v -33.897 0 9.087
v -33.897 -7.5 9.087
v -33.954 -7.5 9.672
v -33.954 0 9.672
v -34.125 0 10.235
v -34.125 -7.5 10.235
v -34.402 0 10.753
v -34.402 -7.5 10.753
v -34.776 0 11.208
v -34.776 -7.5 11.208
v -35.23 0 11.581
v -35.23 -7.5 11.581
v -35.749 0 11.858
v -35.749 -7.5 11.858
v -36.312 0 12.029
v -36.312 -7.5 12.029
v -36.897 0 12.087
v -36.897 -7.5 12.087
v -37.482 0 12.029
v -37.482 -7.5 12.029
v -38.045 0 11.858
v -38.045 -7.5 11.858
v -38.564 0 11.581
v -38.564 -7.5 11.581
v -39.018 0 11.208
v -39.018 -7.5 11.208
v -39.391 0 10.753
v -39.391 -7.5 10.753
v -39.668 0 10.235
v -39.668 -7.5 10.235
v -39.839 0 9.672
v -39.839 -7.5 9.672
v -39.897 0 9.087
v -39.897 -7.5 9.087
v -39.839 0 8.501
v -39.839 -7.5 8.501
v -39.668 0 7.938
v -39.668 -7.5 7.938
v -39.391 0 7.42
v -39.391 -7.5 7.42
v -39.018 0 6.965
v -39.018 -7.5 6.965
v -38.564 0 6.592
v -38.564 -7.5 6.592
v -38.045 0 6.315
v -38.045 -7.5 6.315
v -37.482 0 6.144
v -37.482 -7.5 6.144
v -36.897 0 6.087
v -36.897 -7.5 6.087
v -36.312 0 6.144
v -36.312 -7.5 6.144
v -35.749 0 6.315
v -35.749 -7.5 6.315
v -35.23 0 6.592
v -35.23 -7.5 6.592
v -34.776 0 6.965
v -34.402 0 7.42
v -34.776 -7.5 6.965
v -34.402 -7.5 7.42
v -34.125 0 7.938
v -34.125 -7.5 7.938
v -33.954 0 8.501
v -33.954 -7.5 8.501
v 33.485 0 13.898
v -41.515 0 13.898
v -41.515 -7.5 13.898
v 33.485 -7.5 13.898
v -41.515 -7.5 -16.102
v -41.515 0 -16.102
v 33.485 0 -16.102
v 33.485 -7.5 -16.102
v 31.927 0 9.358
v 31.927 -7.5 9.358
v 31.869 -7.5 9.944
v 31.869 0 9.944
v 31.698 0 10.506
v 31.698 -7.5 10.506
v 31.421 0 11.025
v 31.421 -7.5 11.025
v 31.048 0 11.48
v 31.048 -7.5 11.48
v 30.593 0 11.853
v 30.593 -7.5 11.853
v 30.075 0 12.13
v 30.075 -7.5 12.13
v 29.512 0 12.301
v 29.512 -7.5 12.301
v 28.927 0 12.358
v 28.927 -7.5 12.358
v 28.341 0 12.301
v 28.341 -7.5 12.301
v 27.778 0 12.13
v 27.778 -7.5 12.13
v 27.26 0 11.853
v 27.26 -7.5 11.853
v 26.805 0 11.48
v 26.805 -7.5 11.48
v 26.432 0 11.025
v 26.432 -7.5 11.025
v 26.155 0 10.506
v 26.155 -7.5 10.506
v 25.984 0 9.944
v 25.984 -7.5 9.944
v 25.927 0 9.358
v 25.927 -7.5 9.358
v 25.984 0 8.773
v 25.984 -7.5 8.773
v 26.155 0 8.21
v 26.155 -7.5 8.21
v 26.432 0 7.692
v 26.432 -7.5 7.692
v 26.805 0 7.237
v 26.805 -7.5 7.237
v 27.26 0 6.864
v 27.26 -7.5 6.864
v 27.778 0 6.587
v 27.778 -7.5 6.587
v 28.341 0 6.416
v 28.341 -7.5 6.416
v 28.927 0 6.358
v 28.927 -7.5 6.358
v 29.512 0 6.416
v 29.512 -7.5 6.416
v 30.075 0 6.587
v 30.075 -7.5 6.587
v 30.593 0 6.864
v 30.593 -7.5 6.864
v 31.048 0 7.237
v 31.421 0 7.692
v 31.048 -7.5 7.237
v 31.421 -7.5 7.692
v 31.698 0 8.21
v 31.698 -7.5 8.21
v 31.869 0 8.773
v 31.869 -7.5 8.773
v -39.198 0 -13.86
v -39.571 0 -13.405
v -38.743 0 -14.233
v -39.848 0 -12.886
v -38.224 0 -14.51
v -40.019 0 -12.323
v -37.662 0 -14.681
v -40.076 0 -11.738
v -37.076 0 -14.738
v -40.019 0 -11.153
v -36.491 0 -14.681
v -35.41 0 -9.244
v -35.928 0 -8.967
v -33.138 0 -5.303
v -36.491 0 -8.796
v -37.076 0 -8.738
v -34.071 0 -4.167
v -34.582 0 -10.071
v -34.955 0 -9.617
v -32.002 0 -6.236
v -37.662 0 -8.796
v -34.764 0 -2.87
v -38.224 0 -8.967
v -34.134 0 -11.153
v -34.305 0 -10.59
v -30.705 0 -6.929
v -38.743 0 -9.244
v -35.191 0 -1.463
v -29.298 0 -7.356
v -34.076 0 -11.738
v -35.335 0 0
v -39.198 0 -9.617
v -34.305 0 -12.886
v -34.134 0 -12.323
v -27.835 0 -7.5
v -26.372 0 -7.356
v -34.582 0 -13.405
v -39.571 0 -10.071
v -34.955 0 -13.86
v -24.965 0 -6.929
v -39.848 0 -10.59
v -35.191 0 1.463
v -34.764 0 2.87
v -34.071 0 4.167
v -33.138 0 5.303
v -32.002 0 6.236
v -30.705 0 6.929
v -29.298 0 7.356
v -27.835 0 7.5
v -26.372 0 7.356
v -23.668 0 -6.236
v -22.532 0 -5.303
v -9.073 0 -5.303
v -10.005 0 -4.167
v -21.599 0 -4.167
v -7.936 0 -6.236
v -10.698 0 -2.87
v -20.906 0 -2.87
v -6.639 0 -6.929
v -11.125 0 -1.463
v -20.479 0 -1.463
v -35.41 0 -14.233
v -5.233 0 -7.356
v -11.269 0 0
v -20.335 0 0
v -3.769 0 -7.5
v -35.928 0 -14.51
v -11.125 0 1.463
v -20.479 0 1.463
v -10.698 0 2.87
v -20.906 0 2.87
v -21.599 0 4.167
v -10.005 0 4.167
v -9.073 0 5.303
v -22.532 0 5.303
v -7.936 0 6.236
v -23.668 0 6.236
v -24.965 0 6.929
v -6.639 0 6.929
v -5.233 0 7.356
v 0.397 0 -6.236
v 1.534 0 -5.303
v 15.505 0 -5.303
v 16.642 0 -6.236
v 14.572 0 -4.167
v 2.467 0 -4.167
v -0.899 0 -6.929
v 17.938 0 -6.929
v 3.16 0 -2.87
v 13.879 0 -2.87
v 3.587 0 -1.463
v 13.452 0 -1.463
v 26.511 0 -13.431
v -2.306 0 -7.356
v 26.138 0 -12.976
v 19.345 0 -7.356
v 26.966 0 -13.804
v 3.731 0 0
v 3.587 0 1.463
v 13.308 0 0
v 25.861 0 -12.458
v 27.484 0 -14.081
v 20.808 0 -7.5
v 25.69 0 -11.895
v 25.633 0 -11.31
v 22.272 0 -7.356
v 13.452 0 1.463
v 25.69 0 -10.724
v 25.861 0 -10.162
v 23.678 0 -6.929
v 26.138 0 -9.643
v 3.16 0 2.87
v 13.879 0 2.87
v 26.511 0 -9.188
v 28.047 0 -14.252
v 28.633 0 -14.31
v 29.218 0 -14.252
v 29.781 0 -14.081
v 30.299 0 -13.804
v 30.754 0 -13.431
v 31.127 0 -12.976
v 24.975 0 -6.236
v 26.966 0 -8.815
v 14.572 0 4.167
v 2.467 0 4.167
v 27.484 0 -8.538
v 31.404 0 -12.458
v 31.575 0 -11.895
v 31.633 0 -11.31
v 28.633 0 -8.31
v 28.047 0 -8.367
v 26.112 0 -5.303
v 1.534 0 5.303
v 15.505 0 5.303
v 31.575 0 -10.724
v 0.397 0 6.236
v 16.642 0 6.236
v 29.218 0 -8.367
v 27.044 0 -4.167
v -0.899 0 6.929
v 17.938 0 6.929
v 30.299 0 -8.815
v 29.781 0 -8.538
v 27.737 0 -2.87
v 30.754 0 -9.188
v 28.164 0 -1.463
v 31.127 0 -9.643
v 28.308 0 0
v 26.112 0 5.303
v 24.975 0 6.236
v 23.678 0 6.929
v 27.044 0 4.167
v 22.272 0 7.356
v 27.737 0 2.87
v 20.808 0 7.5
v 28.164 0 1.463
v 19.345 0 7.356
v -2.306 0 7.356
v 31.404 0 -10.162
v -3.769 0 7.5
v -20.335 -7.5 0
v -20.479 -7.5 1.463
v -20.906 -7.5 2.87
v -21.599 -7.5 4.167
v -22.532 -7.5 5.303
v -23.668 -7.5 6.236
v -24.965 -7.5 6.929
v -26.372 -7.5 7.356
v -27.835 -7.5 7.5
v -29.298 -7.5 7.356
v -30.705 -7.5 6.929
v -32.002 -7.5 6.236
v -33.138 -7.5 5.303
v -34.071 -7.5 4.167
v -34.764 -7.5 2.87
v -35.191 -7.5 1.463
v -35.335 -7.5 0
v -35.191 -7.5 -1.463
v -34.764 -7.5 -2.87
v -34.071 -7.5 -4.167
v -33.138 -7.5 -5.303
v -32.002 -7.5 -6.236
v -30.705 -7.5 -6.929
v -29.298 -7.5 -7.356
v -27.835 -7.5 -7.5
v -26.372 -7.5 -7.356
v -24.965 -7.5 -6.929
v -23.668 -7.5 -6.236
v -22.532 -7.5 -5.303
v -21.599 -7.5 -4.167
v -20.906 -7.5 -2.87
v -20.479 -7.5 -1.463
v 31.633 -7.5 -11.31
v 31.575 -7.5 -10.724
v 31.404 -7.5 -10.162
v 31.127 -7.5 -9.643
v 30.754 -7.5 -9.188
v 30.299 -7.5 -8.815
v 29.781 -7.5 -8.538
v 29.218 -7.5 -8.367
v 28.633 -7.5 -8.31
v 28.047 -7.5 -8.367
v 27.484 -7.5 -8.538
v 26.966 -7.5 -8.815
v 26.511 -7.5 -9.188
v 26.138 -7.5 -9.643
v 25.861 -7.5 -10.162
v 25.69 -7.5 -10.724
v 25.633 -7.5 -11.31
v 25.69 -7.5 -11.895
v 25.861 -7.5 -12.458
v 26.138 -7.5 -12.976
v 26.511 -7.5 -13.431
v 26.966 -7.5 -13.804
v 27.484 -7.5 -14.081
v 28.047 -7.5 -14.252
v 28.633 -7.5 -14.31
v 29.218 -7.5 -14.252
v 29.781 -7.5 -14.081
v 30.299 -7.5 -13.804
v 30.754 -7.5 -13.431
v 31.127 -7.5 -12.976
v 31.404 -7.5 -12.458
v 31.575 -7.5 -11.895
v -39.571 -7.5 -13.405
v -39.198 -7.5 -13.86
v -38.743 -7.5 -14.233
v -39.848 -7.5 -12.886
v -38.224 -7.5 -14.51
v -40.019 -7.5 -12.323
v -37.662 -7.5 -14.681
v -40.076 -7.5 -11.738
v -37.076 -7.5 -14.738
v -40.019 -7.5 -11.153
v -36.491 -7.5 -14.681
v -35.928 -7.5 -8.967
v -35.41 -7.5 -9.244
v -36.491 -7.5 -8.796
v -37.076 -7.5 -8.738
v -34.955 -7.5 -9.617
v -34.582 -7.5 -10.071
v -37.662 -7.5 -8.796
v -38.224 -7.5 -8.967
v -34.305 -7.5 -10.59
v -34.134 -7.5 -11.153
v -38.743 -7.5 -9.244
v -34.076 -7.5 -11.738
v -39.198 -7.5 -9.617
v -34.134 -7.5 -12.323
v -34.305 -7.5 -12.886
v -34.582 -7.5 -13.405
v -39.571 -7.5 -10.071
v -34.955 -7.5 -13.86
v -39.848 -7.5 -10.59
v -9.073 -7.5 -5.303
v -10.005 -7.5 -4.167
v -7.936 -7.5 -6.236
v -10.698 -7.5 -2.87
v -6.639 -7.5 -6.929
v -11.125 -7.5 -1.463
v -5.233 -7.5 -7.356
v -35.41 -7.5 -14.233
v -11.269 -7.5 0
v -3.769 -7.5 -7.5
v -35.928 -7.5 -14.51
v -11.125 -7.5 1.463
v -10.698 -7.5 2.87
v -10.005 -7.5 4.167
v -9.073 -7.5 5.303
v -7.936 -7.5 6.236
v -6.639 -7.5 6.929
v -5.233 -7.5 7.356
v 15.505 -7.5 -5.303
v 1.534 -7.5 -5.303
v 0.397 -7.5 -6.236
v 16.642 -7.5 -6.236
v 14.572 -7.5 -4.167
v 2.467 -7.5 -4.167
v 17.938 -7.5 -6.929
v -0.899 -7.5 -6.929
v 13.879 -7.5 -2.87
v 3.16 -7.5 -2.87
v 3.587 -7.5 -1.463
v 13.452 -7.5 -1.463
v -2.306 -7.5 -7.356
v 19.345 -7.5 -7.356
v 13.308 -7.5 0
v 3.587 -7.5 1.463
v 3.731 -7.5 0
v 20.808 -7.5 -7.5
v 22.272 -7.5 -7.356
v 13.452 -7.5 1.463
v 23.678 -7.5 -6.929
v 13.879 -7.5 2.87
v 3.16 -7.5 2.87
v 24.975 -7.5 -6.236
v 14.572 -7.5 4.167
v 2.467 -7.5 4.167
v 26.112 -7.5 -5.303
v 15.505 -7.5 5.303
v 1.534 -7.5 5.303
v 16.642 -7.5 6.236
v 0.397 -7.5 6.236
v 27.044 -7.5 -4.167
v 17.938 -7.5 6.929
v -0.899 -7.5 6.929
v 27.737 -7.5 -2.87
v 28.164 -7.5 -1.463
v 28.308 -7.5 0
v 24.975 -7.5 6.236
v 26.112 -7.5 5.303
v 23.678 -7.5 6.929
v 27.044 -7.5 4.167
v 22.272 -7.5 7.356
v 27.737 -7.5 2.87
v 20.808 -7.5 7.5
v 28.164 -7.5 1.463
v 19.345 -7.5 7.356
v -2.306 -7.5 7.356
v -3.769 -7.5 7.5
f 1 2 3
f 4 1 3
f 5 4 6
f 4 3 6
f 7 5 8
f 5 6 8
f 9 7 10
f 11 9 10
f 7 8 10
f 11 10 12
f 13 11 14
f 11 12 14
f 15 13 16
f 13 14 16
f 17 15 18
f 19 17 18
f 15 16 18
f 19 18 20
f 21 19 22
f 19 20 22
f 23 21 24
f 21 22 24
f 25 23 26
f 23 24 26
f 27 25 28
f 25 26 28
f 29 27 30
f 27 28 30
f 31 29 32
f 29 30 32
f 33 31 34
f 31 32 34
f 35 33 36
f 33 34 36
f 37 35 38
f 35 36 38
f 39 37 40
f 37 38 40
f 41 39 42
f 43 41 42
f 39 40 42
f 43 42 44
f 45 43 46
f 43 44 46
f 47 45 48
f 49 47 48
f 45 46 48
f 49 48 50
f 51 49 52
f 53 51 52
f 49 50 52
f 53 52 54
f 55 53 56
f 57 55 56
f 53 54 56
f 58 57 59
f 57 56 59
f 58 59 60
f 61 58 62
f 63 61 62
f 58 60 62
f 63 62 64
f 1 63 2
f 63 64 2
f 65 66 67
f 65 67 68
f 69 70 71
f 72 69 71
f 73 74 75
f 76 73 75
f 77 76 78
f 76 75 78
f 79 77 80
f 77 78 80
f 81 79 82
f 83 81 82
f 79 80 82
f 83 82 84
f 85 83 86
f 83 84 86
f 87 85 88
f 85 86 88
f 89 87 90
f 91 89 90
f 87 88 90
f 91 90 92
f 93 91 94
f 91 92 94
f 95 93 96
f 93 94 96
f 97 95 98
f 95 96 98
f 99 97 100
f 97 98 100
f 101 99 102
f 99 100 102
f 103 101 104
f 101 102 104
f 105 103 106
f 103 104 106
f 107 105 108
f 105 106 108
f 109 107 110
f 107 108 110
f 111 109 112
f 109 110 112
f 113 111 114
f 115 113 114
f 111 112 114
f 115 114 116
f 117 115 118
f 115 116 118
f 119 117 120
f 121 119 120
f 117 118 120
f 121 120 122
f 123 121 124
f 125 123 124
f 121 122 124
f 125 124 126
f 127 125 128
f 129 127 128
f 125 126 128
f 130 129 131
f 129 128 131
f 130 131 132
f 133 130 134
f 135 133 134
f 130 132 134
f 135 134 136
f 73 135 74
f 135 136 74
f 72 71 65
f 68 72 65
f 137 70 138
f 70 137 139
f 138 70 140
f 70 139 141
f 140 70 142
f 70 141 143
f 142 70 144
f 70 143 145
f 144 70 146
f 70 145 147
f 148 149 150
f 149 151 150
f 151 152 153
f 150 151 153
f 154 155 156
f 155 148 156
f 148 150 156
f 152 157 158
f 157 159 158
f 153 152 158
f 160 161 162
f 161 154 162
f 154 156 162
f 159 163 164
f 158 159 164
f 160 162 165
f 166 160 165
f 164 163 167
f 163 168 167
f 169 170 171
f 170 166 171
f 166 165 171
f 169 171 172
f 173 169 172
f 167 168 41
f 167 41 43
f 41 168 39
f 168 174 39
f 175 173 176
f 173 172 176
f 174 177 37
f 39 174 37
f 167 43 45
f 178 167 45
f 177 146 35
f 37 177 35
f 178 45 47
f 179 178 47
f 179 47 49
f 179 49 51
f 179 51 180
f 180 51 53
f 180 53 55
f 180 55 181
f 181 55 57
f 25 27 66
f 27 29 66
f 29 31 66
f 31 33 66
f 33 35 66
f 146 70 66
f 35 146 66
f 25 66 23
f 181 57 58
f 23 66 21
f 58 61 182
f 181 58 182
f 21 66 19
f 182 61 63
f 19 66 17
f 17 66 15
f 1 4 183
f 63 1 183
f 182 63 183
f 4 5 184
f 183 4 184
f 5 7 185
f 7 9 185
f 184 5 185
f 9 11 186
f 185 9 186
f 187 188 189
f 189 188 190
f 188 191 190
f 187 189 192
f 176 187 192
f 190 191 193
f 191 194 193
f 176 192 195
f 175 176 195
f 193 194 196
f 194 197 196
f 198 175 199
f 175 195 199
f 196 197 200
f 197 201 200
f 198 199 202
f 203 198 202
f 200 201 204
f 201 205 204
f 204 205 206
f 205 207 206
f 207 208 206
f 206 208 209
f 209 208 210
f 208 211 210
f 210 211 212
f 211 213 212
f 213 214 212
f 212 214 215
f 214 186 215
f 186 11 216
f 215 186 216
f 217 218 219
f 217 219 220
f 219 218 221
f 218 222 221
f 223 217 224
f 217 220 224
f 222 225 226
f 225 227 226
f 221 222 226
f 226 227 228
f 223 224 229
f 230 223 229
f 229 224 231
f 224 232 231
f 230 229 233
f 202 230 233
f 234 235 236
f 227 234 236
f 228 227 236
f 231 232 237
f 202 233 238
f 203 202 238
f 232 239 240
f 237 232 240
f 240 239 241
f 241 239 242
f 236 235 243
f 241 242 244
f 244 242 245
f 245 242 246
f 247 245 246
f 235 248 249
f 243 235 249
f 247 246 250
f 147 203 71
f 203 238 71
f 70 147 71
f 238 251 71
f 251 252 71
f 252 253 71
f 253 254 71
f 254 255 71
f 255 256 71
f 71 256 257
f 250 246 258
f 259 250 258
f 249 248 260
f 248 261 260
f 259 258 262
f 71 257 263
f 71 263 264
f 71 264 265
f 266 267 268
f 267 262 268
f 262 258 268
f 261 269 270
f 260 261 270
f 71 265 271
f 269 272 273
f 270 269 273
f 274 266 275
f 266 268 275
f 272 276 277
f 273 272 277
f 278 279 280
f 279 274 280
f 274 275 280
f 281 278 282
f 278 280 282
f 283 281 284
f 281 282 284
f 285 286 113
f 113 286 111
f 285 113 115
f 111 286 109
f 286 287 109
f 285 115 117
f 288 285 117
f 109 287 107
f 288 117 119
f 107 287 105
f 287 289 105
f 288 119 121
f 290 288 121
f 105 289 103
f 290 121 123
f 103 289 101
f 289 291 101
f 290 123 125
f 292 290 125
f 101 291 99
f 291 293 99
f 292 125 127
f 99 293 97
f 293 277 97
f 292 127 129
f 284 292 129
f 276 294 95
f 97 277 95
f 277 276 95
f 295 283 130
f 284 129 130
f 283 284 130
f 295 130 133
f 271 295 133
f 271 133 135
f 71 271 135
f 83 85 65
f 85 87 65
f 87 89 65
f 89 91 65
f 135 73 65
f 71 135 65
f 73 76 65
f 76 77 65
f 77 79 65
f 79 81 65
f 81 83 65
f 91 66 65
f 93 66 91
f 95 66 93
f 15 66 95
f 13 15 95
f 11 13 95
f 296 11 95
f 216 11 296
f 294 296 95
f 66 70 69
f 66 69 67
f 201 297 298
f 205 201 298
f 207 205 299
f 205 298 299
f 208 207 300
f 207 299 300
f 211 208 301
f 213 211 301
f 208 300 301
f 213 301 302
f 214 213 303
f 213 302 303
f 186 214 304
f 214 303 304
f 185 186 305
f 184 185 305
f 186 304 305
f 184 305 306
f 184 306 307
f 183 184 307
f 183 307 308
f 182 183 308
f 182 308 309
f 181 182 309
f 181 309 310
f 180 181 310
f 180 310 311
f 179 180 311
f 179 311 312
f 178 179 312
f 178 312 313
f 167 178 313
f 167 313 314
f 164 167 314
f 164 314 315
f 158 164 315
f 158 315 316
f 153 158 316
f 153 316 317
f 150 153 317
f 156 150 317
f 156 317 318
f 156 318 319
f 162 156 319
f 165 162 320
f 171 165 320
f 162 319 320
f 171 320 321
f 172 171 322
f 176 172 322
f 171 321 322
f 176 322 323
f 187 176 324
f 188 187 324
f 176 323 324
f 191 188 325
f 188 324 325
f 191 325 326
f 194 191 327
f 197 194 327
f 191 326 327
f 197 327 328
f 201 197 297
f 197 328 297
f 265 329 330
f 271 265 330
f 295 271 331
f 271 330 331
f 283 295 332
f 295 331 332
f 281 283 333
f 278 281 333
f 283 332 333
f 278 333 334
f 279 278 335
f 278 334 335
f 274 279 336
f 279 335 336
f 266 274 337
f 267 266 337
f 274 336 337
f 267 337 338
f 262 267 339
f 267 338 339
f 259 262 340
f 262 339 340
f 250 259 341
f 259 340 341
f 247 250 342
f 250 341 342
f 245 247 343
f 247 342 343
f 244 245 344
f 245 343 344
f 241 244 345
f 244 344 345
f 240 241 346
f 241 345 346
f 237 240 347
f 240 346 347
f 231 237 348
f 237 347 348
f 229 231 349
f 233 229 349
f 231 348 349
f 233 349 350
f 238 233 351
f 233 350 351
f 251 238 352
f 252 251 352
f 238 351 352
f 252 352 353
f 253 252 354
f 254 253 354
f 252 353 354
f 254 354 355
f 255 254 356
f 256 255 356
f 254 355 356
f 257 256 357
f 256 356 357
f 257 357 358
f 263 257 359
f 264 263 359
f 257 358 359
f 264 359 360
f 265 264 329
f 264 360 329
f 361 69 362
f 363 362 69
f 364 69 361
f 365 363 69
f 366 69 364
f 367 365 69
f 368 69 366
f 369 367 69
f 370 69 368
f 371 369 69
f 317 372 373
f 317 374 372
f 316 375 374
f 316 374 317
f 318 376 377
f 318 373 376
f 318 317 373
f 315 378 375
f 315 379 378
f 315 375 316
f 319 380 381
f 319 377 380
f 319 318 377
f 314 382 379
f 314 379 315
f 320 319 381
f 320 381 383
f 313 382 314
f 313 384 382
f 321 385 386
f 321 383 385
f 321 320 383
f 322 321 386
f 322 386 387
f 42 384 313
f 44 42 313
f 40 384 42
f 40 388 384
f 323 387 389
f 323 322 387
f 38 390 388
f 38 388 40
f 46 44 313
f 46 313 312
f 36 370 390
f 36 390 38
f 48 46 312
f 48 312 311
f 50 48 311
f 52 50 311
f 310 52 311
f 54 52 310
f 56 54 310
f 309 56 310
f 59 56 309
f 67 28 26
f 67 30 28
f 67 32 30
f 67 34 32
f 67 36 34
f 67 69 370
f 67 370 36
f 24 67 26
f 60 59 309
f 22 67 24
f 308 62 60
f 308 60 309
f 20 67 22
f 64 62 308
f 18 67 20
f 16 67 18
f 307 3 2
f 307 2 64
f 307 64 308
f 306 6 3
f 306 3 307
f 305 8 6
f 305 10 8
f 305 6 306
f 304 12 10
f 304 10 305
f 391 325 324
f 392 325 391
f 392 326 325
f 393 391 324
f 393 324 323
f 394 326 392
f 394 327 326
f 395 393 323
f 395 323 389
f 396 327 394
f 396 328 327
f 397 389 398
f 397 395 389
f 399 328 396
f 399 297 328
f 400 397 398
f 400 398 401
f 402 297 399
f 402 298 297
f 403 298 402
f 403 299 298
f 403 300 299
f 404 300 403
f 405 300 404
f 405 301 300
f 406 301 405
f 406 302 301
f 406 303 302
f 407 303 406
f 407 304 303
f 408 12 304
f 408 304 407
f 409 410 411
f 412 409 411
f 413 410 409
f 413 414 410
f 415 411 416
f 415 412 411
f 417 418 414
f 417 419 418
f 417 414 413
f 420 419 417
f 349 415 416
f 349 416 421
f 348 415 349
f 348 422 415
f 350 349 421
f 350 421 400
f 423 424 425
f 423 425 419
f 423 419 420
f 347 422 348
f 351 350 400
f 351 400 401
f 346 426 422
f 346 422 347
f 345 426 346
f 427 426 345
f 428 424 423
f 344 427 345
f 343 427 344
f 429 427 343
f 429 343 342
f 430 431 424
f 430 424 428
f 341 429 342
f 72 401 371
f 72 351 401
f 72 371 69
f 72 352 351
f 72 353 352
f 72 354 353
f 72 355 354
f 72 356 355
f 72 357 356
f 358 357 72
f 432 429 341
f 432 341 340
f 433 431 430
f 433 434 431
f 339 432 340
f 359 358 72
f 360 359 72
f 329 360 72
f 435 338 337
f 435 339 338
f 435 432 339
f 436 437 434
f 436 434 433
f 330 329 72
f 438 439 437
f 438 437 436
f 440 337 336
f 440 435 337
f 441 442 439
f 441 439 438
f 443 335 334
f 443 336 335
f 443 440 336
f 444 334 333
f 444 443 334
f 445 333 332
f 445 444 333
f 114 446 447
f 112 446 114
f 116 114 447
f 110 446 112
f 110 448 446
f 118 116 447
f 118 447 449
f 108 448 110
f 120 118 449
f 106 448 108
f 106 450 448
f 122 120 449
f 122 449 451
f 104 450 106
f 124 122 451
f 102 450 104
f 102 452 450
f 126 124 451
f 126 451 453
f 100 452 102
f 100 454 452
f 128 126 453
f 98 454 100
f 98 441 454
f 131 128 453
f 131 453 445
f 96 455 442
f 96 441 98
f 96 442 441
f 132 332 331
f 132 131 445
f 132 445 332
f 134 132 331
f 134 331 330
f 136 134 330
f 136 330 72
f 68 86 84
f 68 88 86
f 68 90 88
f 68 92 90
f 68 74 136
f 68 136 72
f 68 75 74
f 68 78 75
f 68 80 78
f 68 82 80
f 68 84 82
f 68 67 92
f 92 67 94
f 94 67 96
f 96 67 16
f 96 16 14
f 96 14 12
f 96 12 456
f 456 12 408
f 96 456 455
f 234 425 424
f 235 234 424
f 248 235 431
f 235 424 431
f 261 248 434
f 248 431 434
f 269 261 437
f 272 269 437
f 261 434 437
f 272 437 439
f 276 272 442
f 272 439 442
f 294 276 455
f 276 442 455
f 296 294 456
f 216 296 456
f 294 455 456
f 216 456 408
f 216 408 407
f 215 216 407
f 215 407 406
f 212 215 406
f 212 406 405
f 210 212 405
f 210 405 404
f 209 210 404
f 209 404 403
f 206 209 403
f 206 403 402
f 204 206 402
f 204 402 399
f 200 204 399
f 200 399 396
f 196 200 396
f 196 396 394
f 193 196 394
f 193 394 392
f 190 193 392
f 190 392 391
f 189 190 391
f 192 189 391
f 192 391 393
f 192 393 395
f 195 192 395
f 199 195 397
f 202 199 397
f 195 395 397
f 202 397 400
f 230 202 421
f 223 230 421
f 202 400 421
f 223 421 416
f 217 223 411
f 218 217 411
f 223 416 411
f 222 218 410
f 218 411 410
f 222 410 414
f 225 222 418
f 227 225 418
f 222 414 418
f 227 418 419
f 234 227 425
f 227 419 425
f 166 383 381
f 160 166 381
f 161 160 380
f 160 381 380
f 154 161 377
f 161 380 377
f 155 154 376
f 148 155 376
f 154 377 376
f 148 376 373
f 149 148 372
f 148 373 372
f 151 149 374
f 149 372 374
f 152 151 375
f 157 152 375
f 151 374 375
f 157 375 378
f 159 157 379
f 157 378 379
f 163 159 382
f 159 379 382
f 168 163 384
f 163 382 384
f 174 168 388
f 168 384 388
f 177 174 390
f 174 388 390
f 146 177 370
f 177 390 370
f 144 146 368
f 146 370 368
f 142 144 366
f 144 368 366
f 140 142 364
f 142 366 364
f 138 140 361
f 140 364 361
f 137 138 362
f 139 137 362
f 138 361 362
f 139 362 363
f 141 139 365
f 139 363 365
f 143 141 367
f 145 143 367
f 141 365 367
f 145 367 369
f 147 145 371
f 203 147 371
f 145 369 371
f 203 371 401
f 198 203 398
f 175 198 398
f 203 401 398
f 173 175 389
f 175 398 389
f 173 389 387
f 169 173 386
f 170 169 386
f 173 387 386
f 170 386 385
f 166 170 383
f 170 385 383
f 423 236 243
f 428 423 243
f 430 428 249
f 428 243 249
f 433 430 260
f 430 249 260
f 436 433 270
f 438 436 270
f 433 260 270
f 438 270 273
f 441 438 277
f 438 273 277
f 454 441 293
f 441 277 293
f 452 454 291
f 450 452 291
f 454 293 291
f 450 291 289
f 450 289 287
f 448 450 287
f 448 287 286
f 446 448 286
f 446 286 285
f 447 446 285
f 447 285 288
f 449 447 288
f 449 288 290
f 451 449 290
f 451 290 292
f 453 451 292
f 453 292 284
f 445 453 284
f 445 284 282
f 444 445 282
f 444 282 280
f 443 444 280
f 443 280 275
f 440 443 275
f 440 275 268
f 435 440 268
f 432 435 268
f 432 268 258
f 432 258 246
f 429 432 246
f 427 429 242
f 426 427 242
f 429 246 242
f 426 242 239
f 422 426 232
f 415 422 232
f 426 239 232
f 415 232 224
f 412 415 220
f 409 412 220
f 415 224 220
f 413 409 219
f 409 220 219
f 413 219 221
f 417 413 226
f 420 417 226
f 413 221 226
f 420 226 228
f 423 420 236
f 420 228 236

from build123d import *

# Parameters (mm, degrees)
F0_W     = 75
F0_H     = 30
F1_DEPTH = 7.5
F2_R     = 7.5
F3_DEPTH = 25
F4_R     = 7.5
F5_DEPTH = 25
F6_R     = 3
F7_DEPTH = 7.5


with BuildPart() as f1:
    # F0 (on Front) → F1 (new body)
    with BuildSketch(Plane.XZ):
        with Locations((-4.015371, -1.101968)):
            Rectangle(F0_W, F0_H)
    extrude(amount=F1_DEPTH)

    # F2 (on face) → F3 (cut)
    with BuildSketch(Plane(origin=(0, 0, 0), x_dir=(-1, 0, 0), z_dir=(0, 1, 0))):
        with Locations((-20.808353, 0)):
            Circle(F2_R)
    extrude(amount=-F3_DEPTH, mode=Mode.SUBTRACT)

    # F4 (on face) → F5 (cut)
    with BuildSketch(Plane.XZ.offset(7.5)):
        with Locations((-3.769332, 0)):
            Circle(F4_R)
        with Locations((-27.835064, 0)):
            Circle(F4_R)
    extrude(amount=-F5_DEPTH, mode=Mode.SUBTRACT)

    # F6 (on face) → F7 (cut, through all)
    with BuildSketch(Plane.XZ.offset(7.5)):
        with Locations((-36.896855, 9.086539)):
            Circle(F6_R)
        with Locations((-37.076353, -11.738191)):
            Circle(F6_R)
        with Locations((28.926538, 9.358378)):
            Circle(F6_R)
        with Locations((28.632505, -11.309632)):
            Circle(F6_R)
    extrude(amount=-F7_DEPTH, mode=Mode.SUBTRACT)


solid = f1.part
